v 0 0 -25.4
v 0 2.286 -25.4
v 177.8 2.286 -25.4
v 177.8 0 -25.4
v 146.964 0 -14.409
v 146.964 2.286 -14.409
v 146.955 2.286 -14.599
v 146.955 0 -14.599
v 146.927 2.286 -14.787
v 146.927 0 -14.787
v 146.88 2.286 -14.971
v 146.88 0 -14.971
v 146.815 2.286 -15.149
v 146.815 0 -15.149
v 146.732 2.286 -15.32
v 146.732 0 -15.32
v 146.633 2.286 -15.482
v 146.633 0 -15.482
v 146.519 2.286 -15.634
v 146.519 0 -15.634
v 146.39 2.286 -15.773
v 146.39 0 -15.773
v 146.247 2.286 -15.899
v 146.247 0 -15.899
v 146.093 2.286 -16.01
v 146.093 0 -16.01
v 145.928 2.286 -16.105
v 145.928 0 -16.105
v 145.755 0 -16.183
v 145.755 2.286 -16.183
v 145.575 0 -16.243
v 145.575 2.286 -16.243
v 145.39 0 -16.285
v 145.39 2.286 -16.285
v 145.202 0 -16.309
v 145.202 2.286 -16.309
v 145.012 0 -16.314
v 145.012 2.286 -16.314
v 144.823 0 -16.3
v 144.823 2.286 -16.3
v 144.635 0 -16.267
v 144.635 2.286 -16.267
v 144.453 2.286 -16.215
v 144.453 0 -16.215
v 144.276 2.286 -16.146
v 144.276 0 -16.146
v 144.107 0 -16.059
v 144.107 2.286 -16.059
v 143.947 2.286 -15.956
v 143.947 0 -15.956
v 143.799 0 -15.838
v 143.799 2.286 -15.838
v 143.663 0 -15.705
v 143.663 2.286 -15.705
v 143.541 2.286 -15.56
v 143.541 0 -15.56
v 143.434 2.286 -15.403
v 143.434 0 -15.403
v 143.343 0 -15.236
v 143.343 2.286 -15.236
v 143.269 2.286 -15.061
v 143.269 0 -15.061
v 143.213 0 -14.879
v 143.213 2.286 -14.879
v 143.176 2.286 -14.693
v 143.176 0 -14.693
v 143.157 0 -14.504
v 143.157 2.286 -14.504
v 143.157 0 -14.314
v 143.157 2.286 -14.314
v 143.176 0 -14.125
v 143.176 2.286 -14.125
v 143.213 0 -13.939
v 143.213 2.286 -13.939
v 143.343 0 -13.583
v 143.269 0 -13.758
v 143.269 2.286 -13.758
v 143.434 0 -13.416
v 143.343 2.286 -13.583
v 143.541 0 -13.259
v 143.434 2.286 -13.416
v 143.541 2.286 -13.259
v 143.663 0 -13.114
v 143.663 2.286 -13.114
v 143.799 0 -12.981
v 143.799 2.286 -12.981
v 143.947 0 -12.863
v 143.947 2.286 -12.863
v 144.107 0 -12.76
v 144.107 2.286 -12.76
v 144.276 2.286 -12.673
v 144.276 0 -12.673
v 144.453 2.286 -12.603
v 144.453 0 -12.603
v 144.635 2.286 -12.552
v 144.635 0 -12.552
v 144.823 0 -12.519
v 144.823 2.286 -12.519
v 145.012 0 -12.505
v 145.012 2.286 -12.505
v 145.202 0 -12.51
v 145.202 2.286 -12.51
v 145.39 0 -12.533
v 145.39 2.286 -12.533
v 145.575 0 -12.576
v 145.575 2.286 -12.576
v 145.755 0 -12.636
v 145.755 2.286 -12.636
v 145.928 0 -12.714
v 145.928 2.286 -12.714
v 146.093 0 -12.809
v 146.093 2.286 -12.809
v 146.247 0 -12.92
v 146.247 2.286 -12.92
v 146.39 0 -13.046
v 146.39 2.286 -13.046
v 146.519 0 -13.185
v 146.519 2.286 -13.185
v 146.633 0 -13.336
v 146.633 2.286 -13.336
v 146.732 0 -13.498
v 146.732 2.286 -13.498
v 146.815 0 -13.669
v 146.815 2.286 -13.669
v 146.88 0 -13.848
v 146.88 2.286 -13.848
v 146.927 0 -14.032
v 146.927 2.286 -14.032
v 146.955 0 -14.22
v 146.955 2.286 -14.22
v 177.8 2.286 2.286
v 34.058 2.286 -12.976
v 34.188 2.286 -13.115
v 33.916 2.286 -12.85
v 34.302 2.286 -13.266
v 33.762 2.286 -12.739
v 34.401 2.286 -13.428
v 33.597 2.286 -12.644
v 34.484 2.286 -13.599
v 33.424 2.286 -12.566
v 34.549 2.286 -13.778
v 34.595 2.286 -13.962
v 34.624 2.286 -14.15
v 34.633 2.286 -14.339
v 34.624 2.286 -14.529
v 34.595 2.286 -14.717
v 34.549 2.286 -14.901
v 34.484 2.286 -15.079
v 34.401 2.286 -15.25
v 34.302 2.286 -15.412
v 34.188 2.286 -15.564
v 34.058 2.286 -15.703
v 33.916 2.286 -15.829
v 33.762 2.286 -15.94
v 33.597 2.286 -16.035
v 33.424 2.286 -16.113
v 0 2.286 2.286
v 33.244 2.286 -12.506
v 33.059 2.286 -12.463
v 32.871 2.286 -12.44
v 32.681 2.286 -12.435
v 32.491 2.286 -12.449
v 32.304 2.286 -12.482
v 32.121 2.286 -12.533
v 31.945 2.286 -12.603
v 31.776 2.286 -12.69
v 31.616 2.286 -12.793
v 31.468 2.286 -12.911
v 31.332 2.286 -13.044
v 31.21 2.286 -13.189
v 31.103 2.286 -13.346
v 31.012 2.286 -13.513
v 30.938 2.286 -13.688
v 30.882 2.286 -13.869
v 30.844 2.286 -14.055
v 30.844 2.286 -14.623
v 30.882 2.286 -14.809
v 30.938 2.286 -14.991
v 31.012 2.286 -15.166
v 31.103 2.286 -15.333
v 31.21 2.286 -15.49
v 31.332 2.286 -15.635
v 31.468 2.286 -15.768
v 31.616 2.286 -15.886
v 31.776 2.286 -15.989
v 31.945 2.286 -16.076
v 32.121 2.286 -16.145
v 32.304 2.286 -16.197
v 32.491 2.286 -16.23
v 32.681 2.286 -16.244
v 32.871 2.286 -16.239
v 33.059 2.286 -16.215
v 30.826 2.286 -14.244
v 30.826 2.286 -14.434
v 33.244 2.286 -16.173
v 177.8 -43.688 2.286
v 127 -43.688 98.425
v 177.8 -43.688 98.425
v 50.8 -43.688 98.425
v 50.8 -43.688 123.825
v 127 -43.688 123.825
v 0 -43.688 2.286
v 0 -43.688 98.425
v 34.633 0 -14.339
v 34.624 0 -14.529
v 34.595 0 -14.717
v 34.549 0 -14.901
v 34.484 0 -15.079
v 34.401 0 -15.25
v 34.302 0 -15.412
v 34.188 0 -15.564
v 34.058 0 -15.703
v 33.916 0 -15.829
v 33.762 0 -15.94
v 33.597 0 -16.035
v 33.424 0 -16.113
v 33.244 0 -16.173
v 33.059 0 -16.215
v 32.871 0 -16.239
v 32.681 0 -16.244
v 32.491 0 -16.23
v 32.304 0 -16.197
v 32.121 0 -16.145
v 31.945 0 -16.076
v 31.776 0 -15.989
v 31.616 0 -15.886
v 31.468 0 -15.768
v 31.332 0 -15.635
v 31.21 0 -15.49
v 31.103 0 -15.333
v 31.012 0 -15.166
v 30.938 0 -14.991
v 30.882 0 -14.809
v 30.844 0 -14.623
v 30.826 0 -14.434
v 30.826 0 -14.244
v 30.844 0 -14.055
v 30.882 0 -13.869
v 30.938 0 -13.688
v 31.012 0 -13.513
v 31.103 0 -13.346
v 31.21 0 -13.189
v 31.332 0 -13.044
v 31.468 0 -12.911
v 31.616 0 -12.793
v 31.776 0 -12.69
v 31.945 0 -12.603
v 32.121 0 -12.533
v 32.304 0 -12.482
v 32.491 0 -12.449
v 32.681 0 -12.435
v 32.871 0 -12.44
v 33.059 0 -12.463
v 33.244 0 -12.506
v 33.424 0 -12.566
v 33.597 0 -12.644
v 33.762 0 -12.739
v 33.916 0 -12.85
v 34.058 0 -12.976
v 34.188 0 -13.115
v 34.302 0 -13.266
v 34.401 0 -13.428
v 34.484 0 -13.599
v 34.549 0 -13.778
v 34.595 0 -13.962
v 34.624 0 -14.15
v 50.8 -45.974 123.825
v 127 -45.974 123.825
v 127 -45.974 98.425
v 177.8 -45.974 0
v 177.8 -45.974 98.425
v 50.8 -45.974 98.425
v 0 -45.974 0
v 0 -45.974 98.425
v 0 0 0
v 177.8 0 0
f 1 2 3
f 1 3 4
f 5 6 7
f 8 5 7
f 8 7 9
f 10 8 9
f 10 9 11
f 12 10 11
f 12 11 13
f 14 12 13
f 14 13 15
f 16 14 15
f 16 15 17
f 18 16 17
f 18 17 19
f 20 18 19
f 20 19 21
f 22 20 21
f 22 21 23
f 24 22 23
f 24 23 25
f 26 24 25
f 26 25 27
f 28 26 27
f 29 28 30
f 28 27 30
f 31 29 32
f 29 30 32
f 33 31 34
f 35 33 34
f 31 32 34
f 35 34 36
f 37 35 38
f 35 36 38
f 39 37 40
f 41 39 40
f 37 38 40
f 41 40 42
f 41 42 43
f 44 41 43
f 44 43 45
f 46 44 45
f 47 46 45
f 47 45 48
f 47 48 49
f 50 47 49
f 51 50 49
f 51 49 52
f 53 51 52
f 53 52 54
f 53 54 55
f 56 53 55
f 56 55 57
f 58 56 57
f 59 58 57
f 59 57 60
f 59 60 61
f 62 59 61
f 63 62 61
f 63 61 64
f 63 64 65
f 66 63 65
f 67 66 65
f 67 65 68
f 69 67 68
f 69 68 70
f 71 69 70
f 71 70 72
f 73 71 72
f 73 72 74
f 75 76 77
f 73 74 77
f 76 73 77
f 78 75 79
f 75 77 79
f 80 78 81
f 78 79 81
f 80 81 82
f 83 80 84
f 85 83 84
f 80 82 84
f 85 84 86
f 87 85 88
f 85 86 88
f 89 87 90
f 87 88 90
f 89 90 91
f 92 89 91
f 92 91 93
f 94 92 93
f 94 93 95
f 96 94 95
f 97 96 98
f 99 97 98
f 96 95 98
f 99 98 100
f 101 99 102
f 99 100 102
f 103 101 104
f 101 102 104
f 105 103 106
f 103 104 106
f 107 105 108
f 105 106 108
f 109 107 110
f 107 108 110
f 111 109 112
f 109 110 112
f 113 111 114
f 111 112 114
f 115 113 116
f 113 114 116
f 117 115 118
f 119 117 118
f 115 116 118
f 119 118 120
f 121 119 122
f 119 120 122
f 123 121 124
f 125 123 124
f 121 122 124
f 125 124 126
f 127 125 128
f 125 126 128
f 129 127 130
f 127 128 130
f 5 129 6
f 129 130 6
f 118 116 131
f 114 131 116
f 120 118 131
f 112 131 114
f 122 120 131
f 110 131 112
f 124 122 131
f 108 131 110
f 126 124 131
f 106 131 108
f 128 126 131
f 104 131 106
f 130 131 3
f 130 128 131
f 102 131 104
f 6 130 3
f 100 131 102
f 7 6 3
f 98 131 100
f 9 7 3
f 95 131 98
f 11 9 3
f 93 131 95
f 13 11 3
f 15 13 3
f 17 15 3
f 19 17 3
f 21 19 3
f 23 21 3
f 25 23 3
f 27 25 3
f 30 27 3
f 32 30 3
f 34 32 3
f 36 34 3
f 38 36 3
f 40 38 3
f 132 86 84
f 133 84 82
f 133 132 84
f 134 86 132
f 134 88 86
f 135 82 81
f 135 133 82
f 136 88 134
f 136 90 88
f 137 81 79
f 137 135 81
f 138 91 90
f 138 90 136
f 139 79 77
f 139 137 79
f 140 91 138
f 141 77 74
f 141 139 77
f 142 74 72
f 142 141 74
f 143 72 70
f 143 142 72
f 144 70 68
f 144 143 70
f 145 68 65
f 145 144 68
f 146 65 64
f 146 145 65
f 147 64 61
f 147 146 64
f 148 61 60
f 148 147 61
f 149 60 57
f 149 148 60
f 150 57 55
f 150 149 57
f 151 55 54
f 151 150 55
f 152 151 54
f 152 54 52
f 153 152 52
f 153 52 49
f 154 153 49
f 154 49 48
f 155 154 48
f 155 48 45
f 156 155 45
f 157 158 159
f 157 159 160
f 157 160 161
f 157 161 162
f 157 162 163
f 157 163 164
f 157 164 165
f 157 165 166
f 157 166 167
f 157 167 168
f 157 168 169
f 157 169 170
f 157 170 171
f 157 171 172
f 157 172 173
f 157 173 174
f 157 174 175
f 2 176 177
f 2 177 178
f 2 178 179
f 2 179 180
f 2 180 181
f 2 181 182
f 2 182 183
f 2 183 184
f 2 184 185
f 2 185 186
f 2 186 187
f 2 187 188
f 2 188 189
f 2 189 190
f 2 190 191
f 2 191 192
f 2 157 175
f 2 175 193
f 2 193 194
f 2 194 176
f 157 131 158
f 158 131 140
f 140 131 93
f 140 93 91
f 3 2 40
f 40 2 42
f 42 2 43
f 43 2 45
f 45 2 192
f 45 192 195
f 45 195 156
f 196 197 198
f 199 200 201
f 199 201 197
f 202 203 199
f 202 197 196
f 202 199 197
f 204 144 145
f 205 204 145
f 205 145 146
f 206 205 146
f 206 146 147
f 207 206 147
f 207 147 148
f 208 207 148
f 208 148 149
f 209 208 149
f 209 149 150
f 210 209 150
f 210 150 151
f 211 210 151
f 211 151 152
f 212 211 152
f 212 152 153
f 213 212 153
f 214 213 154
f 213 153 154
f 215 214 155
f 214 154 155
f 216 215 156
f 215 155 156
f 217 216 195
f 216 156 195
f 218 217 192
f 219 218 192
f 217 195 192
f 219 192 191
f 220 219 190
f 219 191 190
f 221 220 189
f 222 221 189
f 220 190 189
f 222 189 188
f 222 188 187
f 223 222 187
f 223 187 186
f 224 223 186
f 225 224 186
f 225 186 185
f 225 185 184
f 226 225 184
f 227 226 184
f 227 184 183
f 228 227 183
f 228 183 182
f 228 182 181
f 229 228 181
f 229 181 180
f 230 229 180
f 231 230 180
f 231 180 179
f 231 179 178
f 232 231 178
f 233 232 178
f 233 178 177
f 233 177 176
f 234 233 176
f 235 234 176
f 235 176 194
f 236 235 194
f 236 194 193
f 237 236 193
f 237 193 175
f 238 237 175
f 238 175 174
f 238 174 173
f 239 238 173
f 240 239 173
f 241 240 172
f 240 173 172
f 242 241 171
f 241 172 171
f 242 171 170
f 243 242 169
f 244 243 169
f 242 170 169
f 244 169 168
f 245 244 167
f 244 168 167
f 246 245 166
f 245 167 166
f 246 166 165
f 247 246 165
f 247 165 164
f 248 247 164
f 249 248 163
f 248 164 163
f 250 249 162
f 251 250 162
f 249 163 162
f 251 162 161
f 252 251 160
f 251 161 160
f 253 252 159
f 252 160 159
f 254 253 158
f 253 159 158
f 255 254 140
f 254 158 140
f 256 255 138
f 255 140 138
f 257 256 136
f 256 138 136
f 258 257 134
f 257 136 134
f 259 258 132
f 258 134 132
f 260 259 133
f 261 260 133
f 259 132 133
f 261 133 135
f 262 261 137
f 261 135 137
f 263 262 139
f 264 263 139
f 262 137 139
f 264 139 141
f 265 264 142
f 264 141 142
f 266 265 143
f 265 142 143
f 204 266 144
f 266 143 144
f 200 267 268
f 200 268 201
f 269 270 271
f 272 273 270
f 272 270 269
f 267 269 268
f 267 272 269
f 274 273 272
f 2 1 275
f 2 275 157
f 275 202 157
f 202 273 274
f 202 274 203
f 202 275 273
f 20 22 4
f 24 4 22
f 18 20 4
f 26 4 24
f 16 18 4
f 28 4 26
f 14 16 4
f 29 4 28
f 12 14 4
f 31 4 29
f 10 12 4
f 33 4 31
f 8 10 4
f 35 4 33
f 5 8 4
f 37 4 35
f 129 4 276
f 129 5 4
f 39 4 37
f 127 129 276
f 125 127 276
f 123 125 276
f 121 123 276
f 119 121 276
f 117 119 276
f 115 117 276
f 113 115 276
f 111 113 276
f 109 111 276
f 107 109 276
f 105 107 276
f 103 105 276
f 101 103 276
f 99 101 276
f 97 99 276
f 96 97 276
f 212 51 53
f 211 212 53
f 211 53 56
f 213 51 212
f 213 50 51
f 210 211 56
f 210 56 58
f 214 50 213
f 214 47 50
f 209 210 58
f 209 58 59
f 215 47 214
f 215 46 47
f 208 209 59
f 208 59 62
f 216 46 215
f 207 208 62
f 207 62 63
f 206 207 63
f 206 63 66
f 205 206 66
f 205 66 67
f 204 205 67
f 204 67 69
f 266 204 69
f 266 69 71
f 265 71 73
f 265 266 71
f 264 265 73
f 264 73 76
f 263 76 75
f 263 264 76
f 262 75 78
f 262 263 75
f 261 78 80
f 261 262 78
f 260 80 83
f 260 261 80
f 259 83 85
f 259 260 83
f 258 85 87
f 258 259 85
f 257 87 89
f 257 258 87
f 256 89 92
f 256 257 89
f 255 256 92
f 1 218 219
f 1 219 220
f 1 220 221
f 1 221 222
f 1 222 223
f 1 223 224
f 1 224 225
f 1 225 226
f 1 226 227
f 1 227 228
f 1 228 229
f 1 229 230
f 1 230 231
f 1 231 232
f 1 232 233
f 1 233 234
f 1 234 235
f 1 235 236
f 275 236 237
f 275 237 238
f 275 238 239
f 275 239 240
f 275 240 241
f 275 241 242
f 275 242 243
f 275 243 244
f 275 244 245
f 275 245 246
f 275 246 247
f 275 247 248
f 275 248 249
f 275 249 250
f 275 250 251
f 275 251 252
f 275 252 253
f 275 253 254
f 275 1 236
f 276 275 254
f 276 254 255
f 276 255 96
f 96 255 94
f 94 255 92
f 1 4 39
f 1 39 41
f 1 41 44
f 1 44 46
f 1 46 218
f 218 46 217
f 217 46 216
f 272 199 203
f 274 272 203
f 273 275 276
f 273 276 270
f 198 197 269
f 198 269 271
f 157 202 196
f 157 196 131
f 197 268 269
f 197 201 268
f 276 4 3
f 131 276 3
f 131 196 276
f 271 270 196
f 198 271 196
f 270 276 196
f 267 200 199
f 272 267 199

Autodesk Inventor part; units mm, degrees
ref_plane "YZ Plane" through (0, 0, 0) normal (1, 0, 0) x (0, 1, 0)
ref_plane "XZ Plane" through (0, 0, 0) normal (0, 1, 0) x (-1, 0, 0)
ref_plane "XY Plane" through (0, 0, 0) normal (0, 0, 1) x (1, 0, 0)
sketch "Sketch1" plane through (0, 0, 0) normal (1, 0, 0) x (0, 1, 0)
  line L0 (0, 0) -> (2.286, 0)
  line L1 (2.286, 0) -> (2.286, -25.4)
  line L2 (2.286, -25.4) -> (0, -25.4)
  line L3 (0, -25.4) -> (0, 0)
  line L4 (0, 0) -> (-45.974, 0)
  line L5 (-45.974, 0) -> (-45.974, 123.825)
  line L6 (-45.974, 123.825) -> (-43.688, 123.825)
  line L7 (-43.688, 123.825) -> (-43.688, 0)
  line L8 (-45.974, 0) -> (-45.974, 2.286)
  line L9 (-45.974, 2.286) -> (2.286, 2.286)
  line L10 (2.286, 2.286) -> (2.286, 0)
  point P0 (-43.688, 2.286)
  dimension "d0" = 25.4
  dimension "d1" = 2.286
  dimension "d4" = 2.286
  dimension "d5" = 2.286
extrude "Extrusion1" add sketch "Sketch1" along normal blind 177.8
sketch "Sketch2" plane through (0, -43.688, 123.825) normal (0, 1, 0) x (1, 0, 0)
  line L0 (0, 0) -> (177.8, 0) projected
  line L1 (0, 0) -> (50.8, 0)
  line L2 (50.8, 0) -> (50.8, 25.4)
  line L3 (50.8, 25.4) -> (0, 25.4)
  line L4 (0, 25.4) -> (0, 0)
  line L5 (177.8, 0) -> (127, 0)
  line L6 (127, 0) -> (127, 25.4)
  line L7 (127, 25.4) -> (177.8, 25.4)
  line L8 (177.8, 25.4) -> (177.8, 0)
  point P0 (0, 123.825)
  point P1 (50.8, 0)
  point P2 (127, 0)
  dimension "d8" = 50.8
  dimension "d9" = 25.4
  dimension "d10" = 50.8
extrude "Extrusion2" cut sketch "Sketch2" against normal blind 177.8
sketch "Sketch4" plane through (0, 2.286, 2.286) normal (0, 1, 0) x (1, 0, 0)
  line L0 (0, 2.286) -> (0, 27.686) projected
  line L1 (0, 16.6049) -> (177.8, 16.7157)
  line L2 (177.8, 27.686) -> (177.8, 0) projected
  circle A0 centre (32.7282, 16.6253) radius 1.905
  line L3 (0, 27.686) -> (177.8, 27.686) projected
  line L4 (0, 0) -> (177.8, 0) projected
  line L5 (177.8, 27.686) -> (145.0594, 27.686)
  line L6 (145.0594, 27.686) -> (145.0594, 0)
  line L7 (145.0594, 0) -> (177.8, 0)
  line L8 (177.8, 0) -> (177.8, 27.686)
  circle A1 centre (145.0594, 16.6953) radius 1.905
  dimension "d13" = 3.81
  dimension "d14" = 32.7406
  dimension "d15" = 3.81
extrude "Extrusion3" cut sketch "Sketch4" against normal blind 177.8 contours A0 L1 | L1 A0 | A1 L1 L6 | L6 L1 A1 | L1 L6 A1 | L1 A1 L6
properties part number "Plate"
